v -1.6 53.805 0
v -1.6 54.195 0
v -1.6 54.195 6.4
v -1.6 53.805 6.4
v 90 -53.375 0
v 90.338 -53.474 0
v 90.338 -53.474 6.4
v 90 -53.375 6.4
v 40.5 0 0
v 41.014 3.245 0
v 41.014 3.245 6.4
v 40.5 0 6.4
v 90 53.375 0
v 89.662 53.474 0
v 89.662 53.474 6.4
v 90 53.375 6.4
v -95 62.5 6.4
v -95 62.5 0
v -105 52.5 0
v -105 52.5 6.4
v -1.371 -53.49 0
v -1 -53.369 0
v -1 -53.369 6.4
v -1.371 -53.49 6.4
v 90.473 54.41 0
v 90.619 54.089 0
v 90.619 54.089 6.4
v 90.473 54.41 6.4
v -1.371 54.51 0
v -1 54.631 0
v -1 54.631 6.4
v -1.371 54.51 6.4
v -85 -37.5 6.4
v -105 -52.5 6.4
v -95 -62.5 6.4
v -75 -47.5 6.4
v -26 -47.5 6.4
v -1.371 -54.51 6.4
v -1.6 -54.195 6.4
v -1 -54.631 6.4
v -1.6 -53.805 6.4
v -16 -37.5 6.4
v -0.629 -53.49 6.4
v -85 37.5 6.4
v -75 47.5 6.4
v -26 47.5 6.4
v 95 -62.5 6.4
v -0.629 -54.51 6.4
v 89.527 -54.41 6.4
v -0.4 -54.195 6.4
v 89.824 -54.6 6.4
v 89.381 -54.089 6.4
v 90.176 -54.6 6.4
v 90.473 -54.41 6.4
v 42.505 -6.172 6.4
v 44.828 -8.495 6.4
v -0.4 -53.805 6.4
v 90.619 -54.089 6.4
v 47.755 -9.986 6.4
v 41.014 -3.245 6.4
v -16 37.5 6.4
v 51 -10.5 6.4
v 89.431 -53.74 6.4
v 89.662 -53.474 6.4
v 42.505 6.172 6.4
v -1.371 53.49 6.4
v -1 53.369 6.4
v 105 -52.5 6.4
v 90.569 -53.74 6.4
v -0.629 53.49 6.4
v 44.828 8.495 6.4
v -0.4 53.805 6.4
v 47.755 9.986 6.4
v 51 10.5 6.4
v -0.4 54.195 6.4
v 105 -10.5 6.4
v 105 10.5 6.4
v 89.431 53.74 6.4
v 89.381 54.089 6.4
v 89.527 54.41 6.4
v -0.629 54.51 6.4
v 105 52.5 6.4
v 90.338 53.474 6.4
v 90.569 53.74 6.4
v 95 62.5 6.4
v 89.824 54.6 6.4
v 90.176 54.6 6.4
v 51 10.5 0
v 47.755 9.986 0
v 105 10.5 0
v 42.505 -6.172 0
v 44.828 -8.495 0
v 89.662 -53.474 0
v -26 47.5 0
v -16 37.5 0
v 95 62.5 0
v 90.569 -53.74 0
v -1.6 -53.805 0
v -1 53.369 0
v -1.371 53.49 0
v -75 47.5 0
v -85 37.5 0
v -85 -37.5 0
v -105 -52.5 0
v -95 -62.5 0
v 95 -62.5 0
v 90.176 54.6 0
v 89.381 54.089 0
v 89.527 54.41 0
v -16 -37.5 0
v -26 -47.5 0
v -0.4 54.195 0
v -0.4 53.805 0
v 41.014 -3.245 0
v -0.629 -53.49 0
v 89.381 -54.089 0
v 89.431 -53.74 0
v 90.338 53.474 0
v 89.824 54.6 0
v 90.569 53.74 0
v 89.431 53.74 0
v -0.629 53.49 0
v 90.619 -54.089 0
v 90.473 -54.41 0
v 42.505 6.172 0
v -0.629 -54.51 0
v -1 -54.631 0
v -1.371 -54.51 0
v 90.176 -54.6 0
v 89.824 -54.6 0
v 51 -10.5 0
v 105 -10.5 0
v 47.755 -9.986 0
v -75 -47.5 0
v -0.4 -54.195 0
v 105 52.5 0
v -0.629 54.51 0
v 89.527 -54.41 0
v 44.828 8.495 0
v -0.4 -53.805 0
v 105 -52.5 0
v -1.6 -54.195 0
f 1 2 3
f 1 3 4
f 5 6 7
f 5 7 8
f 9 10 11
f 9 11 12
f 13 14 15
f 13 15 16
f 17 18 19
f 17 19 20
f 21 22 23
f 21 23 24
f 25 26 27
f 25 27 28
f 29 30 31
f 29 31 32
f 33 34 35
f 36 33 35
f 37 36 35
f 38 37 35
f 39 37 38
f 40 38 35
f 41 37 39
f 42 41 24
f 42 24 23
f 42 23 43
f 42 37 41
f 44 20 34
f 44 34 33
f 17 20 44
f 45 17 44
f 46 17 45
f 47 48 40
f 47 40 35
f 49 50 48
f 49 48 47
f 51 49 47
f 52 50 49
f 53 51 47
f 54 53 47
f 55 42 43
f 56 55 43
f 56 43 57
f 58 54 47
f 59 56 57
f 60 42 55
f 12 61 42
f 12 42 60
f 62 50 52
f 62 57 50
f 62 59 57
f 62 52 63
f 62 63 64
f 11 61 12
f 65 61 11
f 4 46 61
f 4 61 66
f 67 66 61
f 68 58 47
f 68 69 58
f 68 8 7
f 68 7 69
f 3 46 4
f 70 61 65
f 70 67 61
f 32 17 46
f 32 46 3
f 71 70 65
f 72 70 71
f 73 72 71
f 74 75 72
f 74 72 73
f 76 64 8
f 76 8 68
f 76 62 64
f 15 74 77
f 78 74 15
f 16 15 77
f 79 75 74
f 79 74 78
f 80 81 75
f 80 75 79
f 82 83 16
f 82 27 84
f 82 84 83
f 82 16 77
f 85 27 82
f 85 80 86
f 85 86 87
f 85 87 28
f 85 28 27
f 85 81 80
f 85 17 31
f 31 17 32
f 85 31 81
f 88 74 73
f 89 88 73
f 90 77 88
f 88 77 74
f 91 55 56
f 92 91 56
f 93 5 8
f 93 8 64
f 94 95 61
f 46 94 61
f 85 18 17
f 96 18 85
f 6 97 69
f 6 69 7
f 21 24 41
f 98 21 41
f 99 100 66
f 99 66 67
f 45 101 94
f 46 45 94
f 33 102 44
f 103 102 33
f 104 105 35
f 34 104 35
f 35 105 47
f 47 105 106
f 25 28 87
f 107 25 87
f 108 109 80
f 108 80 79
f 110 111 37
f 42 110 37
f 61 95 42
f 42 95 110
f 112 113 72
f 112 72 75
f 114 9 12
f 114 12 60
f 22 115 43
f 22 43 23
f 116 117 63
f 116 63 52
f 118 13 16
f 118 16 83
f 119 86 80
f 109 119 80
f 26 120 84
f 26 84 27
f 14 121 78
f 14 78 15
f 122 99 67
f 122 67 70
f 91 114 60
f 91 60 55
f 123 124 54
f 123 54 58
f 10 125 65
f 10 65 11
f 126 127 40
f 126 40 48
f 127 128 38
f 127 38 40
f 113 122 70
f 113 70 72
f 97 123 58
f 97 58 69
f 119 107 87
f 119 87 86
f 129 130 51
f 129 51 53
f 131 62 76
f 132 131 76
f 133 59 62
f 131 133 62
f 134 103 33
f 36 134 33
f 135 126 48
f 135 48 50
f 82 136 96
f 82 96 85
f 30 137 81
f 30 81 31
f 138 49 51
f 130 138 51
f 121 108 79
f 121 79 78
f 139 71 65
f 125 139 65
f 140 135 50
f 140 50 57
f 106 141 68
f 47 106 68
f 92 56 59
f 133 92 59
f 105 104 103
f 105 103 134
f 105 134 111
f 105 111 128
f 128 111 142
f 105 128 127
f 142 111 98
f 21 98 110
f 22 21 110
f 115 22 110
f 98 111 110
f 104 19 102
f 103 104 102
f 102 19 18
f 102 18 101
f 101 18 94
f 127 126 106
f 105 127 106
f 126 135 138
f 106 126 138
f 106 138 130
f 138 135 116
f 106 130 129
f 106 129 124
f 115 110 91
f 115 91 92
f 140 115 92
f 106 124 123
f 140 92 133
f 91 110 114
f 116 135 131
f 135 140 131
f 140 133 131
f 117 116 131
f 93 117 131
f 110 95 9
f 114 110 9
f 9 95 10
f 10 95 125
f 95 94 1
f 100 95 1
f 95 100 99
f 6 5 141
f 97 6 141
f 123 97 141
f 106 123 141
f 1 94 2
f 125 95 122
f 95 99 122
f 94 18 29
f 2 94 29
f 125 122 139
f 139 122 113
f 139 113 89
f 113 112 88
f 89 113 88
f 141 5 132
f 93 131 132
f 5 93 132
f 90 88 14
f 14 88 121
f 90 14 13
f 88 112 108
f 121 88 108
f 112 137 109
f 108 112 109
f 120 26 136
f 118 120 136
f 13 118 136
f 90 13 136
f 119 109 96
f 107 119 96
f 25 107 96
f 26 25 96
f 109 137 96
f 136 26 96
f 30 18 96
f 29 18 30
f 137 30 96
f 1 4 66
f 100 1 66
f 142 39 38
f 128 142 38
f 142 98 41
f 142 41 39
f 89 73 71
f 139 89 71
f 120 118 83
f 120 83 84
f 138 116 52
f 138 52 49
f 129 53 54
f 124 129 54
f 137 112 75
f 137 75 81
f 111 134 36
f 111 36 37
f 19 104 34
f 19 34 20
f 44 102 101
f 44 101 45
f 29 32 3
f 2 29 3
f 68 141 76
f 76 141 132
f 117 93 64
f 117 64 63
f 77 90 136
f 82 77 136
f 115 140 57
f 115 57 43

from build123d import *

# Parameters (mm, degrees)
F0_W     = 210
F0_H     = 125
F1_DEPTH = 6.4
F3_DEPTH = 25
F5_DEPTH = 6.401
F6_SIZE  = 10
F7_W     = 69
F7_H     = 95
F8_DEPTH = 6.401
F9_SIZE  = 10


with BuildPart() as f1:
    # F0 (on Top) → F1 (new body)
    with BuildSketch(Plane.XY):
        Rectangle(F0_W, F0_H)
    extrude(amount=F1_DEPTH)

    # F2 (on face) → F3 (cut)
    with BuildSketch(Plane.XY.offset(6.4)):
        Polygon((105, 10.5), (51, 10.5), (47.755322, 9.986093), (44.828255, 8.494678), (42.505322, 6.171745), (41.013907, 3.244678), (40.5, 0), (41.013907, -3.244678), (42.505322, -6.171745), (44.828255, -8.494678), (47.755322, -9.986093), (51, -10.5), (105, -10.5), align=None)
    extrude(amount=-F3_DEPTH, mode=Mode.SUBTRACT)

    # F4 (on Top) → F5 (cut, through all)
    with BuildSketch(Plane.XY):
        Polygon((89.661921, 53.473939), (90, 53.37467), (90.338079, 53.473939), (90.56882, 53.740228), (90.618965, 54.088994), (90.472593, 54.409504), (90.176176, 54.6), (89.823824, 54.6), (89.527407, 54.409504), (89.381035, 54.088994), (89.43118, 53.740228), align=None)
        Polygon((90.472593, -54.409504), (90.618965, -54.088994), (90.56882, -53.740228), (90.338079, -53.473939), (90, -53.37467), (89.661921, -53.473939), (89.43118, -53.740228), (89.381035, -54.088994), (89.527407, -54.409504), (89.823824, -54.6), (90.176176, -54.6), align=None)
        Polygon((-0.62918, 53.48961), (-0.4, 53.805048), (-0.4, 54.194952), (-0.62918, 54.51039), (-1, 54.630877), (-1.37082, 54.51039), (-1.6, 54.194952), (-1.6, 53.805048), (-1.37082, 53.48961), (-1, 53.369123), align=None)
        Polygon((-1.37082, -53.48961), (-1.6, -53.805048), (-1.6, -54.194952), (-1.37082, -54.51039), (-1, -54.630877), (-0.62918, -54.51039), (-0.4, -54.194952), (-0.4, -53.805048), (-0.62918, -53.48961), (-1, -53.369123), align=None)
    extrude(amount=F5_DEPTH, mode=Mode.SUBTRACT)

    # F6
    f6_edges = [f1.edges().sort_by_distance(p)[0] for p in [
        (-105, 62.5, 3.2),
        (105, 62.5, 3.2),
        (105, -62.5, 3.2),
        (-105, -62.5, 3.2),
    ]]
    chamfer(f6_edges, length=F6_SIZE)

    # F7 (on face) → F8 (cut, through all)
    with BuildSketch(Plane(origin=(0, 0, 0), x_dir=(1, 0, 0), z_dir=(0, 0, -1))):
        with Locations((-50.5, 0)):
            Rectangle(F7_W, F7_H)
    extrude(amount=-F8_DEPTH, mode=Mode.SUBTRACT)

    # F9
    f9_edges = [f1.edges().sort_by_distance(p)[0] for p in [
        (-85, 47.5, 3.2),
        (-16, 47.5, 3.2),
        (-16, -47.5, 3.2),
        (-85, -47.5, 3.2),
    ]]
    chamfer(f9_edges, length=F9_SIZE)


solid = f1.part
